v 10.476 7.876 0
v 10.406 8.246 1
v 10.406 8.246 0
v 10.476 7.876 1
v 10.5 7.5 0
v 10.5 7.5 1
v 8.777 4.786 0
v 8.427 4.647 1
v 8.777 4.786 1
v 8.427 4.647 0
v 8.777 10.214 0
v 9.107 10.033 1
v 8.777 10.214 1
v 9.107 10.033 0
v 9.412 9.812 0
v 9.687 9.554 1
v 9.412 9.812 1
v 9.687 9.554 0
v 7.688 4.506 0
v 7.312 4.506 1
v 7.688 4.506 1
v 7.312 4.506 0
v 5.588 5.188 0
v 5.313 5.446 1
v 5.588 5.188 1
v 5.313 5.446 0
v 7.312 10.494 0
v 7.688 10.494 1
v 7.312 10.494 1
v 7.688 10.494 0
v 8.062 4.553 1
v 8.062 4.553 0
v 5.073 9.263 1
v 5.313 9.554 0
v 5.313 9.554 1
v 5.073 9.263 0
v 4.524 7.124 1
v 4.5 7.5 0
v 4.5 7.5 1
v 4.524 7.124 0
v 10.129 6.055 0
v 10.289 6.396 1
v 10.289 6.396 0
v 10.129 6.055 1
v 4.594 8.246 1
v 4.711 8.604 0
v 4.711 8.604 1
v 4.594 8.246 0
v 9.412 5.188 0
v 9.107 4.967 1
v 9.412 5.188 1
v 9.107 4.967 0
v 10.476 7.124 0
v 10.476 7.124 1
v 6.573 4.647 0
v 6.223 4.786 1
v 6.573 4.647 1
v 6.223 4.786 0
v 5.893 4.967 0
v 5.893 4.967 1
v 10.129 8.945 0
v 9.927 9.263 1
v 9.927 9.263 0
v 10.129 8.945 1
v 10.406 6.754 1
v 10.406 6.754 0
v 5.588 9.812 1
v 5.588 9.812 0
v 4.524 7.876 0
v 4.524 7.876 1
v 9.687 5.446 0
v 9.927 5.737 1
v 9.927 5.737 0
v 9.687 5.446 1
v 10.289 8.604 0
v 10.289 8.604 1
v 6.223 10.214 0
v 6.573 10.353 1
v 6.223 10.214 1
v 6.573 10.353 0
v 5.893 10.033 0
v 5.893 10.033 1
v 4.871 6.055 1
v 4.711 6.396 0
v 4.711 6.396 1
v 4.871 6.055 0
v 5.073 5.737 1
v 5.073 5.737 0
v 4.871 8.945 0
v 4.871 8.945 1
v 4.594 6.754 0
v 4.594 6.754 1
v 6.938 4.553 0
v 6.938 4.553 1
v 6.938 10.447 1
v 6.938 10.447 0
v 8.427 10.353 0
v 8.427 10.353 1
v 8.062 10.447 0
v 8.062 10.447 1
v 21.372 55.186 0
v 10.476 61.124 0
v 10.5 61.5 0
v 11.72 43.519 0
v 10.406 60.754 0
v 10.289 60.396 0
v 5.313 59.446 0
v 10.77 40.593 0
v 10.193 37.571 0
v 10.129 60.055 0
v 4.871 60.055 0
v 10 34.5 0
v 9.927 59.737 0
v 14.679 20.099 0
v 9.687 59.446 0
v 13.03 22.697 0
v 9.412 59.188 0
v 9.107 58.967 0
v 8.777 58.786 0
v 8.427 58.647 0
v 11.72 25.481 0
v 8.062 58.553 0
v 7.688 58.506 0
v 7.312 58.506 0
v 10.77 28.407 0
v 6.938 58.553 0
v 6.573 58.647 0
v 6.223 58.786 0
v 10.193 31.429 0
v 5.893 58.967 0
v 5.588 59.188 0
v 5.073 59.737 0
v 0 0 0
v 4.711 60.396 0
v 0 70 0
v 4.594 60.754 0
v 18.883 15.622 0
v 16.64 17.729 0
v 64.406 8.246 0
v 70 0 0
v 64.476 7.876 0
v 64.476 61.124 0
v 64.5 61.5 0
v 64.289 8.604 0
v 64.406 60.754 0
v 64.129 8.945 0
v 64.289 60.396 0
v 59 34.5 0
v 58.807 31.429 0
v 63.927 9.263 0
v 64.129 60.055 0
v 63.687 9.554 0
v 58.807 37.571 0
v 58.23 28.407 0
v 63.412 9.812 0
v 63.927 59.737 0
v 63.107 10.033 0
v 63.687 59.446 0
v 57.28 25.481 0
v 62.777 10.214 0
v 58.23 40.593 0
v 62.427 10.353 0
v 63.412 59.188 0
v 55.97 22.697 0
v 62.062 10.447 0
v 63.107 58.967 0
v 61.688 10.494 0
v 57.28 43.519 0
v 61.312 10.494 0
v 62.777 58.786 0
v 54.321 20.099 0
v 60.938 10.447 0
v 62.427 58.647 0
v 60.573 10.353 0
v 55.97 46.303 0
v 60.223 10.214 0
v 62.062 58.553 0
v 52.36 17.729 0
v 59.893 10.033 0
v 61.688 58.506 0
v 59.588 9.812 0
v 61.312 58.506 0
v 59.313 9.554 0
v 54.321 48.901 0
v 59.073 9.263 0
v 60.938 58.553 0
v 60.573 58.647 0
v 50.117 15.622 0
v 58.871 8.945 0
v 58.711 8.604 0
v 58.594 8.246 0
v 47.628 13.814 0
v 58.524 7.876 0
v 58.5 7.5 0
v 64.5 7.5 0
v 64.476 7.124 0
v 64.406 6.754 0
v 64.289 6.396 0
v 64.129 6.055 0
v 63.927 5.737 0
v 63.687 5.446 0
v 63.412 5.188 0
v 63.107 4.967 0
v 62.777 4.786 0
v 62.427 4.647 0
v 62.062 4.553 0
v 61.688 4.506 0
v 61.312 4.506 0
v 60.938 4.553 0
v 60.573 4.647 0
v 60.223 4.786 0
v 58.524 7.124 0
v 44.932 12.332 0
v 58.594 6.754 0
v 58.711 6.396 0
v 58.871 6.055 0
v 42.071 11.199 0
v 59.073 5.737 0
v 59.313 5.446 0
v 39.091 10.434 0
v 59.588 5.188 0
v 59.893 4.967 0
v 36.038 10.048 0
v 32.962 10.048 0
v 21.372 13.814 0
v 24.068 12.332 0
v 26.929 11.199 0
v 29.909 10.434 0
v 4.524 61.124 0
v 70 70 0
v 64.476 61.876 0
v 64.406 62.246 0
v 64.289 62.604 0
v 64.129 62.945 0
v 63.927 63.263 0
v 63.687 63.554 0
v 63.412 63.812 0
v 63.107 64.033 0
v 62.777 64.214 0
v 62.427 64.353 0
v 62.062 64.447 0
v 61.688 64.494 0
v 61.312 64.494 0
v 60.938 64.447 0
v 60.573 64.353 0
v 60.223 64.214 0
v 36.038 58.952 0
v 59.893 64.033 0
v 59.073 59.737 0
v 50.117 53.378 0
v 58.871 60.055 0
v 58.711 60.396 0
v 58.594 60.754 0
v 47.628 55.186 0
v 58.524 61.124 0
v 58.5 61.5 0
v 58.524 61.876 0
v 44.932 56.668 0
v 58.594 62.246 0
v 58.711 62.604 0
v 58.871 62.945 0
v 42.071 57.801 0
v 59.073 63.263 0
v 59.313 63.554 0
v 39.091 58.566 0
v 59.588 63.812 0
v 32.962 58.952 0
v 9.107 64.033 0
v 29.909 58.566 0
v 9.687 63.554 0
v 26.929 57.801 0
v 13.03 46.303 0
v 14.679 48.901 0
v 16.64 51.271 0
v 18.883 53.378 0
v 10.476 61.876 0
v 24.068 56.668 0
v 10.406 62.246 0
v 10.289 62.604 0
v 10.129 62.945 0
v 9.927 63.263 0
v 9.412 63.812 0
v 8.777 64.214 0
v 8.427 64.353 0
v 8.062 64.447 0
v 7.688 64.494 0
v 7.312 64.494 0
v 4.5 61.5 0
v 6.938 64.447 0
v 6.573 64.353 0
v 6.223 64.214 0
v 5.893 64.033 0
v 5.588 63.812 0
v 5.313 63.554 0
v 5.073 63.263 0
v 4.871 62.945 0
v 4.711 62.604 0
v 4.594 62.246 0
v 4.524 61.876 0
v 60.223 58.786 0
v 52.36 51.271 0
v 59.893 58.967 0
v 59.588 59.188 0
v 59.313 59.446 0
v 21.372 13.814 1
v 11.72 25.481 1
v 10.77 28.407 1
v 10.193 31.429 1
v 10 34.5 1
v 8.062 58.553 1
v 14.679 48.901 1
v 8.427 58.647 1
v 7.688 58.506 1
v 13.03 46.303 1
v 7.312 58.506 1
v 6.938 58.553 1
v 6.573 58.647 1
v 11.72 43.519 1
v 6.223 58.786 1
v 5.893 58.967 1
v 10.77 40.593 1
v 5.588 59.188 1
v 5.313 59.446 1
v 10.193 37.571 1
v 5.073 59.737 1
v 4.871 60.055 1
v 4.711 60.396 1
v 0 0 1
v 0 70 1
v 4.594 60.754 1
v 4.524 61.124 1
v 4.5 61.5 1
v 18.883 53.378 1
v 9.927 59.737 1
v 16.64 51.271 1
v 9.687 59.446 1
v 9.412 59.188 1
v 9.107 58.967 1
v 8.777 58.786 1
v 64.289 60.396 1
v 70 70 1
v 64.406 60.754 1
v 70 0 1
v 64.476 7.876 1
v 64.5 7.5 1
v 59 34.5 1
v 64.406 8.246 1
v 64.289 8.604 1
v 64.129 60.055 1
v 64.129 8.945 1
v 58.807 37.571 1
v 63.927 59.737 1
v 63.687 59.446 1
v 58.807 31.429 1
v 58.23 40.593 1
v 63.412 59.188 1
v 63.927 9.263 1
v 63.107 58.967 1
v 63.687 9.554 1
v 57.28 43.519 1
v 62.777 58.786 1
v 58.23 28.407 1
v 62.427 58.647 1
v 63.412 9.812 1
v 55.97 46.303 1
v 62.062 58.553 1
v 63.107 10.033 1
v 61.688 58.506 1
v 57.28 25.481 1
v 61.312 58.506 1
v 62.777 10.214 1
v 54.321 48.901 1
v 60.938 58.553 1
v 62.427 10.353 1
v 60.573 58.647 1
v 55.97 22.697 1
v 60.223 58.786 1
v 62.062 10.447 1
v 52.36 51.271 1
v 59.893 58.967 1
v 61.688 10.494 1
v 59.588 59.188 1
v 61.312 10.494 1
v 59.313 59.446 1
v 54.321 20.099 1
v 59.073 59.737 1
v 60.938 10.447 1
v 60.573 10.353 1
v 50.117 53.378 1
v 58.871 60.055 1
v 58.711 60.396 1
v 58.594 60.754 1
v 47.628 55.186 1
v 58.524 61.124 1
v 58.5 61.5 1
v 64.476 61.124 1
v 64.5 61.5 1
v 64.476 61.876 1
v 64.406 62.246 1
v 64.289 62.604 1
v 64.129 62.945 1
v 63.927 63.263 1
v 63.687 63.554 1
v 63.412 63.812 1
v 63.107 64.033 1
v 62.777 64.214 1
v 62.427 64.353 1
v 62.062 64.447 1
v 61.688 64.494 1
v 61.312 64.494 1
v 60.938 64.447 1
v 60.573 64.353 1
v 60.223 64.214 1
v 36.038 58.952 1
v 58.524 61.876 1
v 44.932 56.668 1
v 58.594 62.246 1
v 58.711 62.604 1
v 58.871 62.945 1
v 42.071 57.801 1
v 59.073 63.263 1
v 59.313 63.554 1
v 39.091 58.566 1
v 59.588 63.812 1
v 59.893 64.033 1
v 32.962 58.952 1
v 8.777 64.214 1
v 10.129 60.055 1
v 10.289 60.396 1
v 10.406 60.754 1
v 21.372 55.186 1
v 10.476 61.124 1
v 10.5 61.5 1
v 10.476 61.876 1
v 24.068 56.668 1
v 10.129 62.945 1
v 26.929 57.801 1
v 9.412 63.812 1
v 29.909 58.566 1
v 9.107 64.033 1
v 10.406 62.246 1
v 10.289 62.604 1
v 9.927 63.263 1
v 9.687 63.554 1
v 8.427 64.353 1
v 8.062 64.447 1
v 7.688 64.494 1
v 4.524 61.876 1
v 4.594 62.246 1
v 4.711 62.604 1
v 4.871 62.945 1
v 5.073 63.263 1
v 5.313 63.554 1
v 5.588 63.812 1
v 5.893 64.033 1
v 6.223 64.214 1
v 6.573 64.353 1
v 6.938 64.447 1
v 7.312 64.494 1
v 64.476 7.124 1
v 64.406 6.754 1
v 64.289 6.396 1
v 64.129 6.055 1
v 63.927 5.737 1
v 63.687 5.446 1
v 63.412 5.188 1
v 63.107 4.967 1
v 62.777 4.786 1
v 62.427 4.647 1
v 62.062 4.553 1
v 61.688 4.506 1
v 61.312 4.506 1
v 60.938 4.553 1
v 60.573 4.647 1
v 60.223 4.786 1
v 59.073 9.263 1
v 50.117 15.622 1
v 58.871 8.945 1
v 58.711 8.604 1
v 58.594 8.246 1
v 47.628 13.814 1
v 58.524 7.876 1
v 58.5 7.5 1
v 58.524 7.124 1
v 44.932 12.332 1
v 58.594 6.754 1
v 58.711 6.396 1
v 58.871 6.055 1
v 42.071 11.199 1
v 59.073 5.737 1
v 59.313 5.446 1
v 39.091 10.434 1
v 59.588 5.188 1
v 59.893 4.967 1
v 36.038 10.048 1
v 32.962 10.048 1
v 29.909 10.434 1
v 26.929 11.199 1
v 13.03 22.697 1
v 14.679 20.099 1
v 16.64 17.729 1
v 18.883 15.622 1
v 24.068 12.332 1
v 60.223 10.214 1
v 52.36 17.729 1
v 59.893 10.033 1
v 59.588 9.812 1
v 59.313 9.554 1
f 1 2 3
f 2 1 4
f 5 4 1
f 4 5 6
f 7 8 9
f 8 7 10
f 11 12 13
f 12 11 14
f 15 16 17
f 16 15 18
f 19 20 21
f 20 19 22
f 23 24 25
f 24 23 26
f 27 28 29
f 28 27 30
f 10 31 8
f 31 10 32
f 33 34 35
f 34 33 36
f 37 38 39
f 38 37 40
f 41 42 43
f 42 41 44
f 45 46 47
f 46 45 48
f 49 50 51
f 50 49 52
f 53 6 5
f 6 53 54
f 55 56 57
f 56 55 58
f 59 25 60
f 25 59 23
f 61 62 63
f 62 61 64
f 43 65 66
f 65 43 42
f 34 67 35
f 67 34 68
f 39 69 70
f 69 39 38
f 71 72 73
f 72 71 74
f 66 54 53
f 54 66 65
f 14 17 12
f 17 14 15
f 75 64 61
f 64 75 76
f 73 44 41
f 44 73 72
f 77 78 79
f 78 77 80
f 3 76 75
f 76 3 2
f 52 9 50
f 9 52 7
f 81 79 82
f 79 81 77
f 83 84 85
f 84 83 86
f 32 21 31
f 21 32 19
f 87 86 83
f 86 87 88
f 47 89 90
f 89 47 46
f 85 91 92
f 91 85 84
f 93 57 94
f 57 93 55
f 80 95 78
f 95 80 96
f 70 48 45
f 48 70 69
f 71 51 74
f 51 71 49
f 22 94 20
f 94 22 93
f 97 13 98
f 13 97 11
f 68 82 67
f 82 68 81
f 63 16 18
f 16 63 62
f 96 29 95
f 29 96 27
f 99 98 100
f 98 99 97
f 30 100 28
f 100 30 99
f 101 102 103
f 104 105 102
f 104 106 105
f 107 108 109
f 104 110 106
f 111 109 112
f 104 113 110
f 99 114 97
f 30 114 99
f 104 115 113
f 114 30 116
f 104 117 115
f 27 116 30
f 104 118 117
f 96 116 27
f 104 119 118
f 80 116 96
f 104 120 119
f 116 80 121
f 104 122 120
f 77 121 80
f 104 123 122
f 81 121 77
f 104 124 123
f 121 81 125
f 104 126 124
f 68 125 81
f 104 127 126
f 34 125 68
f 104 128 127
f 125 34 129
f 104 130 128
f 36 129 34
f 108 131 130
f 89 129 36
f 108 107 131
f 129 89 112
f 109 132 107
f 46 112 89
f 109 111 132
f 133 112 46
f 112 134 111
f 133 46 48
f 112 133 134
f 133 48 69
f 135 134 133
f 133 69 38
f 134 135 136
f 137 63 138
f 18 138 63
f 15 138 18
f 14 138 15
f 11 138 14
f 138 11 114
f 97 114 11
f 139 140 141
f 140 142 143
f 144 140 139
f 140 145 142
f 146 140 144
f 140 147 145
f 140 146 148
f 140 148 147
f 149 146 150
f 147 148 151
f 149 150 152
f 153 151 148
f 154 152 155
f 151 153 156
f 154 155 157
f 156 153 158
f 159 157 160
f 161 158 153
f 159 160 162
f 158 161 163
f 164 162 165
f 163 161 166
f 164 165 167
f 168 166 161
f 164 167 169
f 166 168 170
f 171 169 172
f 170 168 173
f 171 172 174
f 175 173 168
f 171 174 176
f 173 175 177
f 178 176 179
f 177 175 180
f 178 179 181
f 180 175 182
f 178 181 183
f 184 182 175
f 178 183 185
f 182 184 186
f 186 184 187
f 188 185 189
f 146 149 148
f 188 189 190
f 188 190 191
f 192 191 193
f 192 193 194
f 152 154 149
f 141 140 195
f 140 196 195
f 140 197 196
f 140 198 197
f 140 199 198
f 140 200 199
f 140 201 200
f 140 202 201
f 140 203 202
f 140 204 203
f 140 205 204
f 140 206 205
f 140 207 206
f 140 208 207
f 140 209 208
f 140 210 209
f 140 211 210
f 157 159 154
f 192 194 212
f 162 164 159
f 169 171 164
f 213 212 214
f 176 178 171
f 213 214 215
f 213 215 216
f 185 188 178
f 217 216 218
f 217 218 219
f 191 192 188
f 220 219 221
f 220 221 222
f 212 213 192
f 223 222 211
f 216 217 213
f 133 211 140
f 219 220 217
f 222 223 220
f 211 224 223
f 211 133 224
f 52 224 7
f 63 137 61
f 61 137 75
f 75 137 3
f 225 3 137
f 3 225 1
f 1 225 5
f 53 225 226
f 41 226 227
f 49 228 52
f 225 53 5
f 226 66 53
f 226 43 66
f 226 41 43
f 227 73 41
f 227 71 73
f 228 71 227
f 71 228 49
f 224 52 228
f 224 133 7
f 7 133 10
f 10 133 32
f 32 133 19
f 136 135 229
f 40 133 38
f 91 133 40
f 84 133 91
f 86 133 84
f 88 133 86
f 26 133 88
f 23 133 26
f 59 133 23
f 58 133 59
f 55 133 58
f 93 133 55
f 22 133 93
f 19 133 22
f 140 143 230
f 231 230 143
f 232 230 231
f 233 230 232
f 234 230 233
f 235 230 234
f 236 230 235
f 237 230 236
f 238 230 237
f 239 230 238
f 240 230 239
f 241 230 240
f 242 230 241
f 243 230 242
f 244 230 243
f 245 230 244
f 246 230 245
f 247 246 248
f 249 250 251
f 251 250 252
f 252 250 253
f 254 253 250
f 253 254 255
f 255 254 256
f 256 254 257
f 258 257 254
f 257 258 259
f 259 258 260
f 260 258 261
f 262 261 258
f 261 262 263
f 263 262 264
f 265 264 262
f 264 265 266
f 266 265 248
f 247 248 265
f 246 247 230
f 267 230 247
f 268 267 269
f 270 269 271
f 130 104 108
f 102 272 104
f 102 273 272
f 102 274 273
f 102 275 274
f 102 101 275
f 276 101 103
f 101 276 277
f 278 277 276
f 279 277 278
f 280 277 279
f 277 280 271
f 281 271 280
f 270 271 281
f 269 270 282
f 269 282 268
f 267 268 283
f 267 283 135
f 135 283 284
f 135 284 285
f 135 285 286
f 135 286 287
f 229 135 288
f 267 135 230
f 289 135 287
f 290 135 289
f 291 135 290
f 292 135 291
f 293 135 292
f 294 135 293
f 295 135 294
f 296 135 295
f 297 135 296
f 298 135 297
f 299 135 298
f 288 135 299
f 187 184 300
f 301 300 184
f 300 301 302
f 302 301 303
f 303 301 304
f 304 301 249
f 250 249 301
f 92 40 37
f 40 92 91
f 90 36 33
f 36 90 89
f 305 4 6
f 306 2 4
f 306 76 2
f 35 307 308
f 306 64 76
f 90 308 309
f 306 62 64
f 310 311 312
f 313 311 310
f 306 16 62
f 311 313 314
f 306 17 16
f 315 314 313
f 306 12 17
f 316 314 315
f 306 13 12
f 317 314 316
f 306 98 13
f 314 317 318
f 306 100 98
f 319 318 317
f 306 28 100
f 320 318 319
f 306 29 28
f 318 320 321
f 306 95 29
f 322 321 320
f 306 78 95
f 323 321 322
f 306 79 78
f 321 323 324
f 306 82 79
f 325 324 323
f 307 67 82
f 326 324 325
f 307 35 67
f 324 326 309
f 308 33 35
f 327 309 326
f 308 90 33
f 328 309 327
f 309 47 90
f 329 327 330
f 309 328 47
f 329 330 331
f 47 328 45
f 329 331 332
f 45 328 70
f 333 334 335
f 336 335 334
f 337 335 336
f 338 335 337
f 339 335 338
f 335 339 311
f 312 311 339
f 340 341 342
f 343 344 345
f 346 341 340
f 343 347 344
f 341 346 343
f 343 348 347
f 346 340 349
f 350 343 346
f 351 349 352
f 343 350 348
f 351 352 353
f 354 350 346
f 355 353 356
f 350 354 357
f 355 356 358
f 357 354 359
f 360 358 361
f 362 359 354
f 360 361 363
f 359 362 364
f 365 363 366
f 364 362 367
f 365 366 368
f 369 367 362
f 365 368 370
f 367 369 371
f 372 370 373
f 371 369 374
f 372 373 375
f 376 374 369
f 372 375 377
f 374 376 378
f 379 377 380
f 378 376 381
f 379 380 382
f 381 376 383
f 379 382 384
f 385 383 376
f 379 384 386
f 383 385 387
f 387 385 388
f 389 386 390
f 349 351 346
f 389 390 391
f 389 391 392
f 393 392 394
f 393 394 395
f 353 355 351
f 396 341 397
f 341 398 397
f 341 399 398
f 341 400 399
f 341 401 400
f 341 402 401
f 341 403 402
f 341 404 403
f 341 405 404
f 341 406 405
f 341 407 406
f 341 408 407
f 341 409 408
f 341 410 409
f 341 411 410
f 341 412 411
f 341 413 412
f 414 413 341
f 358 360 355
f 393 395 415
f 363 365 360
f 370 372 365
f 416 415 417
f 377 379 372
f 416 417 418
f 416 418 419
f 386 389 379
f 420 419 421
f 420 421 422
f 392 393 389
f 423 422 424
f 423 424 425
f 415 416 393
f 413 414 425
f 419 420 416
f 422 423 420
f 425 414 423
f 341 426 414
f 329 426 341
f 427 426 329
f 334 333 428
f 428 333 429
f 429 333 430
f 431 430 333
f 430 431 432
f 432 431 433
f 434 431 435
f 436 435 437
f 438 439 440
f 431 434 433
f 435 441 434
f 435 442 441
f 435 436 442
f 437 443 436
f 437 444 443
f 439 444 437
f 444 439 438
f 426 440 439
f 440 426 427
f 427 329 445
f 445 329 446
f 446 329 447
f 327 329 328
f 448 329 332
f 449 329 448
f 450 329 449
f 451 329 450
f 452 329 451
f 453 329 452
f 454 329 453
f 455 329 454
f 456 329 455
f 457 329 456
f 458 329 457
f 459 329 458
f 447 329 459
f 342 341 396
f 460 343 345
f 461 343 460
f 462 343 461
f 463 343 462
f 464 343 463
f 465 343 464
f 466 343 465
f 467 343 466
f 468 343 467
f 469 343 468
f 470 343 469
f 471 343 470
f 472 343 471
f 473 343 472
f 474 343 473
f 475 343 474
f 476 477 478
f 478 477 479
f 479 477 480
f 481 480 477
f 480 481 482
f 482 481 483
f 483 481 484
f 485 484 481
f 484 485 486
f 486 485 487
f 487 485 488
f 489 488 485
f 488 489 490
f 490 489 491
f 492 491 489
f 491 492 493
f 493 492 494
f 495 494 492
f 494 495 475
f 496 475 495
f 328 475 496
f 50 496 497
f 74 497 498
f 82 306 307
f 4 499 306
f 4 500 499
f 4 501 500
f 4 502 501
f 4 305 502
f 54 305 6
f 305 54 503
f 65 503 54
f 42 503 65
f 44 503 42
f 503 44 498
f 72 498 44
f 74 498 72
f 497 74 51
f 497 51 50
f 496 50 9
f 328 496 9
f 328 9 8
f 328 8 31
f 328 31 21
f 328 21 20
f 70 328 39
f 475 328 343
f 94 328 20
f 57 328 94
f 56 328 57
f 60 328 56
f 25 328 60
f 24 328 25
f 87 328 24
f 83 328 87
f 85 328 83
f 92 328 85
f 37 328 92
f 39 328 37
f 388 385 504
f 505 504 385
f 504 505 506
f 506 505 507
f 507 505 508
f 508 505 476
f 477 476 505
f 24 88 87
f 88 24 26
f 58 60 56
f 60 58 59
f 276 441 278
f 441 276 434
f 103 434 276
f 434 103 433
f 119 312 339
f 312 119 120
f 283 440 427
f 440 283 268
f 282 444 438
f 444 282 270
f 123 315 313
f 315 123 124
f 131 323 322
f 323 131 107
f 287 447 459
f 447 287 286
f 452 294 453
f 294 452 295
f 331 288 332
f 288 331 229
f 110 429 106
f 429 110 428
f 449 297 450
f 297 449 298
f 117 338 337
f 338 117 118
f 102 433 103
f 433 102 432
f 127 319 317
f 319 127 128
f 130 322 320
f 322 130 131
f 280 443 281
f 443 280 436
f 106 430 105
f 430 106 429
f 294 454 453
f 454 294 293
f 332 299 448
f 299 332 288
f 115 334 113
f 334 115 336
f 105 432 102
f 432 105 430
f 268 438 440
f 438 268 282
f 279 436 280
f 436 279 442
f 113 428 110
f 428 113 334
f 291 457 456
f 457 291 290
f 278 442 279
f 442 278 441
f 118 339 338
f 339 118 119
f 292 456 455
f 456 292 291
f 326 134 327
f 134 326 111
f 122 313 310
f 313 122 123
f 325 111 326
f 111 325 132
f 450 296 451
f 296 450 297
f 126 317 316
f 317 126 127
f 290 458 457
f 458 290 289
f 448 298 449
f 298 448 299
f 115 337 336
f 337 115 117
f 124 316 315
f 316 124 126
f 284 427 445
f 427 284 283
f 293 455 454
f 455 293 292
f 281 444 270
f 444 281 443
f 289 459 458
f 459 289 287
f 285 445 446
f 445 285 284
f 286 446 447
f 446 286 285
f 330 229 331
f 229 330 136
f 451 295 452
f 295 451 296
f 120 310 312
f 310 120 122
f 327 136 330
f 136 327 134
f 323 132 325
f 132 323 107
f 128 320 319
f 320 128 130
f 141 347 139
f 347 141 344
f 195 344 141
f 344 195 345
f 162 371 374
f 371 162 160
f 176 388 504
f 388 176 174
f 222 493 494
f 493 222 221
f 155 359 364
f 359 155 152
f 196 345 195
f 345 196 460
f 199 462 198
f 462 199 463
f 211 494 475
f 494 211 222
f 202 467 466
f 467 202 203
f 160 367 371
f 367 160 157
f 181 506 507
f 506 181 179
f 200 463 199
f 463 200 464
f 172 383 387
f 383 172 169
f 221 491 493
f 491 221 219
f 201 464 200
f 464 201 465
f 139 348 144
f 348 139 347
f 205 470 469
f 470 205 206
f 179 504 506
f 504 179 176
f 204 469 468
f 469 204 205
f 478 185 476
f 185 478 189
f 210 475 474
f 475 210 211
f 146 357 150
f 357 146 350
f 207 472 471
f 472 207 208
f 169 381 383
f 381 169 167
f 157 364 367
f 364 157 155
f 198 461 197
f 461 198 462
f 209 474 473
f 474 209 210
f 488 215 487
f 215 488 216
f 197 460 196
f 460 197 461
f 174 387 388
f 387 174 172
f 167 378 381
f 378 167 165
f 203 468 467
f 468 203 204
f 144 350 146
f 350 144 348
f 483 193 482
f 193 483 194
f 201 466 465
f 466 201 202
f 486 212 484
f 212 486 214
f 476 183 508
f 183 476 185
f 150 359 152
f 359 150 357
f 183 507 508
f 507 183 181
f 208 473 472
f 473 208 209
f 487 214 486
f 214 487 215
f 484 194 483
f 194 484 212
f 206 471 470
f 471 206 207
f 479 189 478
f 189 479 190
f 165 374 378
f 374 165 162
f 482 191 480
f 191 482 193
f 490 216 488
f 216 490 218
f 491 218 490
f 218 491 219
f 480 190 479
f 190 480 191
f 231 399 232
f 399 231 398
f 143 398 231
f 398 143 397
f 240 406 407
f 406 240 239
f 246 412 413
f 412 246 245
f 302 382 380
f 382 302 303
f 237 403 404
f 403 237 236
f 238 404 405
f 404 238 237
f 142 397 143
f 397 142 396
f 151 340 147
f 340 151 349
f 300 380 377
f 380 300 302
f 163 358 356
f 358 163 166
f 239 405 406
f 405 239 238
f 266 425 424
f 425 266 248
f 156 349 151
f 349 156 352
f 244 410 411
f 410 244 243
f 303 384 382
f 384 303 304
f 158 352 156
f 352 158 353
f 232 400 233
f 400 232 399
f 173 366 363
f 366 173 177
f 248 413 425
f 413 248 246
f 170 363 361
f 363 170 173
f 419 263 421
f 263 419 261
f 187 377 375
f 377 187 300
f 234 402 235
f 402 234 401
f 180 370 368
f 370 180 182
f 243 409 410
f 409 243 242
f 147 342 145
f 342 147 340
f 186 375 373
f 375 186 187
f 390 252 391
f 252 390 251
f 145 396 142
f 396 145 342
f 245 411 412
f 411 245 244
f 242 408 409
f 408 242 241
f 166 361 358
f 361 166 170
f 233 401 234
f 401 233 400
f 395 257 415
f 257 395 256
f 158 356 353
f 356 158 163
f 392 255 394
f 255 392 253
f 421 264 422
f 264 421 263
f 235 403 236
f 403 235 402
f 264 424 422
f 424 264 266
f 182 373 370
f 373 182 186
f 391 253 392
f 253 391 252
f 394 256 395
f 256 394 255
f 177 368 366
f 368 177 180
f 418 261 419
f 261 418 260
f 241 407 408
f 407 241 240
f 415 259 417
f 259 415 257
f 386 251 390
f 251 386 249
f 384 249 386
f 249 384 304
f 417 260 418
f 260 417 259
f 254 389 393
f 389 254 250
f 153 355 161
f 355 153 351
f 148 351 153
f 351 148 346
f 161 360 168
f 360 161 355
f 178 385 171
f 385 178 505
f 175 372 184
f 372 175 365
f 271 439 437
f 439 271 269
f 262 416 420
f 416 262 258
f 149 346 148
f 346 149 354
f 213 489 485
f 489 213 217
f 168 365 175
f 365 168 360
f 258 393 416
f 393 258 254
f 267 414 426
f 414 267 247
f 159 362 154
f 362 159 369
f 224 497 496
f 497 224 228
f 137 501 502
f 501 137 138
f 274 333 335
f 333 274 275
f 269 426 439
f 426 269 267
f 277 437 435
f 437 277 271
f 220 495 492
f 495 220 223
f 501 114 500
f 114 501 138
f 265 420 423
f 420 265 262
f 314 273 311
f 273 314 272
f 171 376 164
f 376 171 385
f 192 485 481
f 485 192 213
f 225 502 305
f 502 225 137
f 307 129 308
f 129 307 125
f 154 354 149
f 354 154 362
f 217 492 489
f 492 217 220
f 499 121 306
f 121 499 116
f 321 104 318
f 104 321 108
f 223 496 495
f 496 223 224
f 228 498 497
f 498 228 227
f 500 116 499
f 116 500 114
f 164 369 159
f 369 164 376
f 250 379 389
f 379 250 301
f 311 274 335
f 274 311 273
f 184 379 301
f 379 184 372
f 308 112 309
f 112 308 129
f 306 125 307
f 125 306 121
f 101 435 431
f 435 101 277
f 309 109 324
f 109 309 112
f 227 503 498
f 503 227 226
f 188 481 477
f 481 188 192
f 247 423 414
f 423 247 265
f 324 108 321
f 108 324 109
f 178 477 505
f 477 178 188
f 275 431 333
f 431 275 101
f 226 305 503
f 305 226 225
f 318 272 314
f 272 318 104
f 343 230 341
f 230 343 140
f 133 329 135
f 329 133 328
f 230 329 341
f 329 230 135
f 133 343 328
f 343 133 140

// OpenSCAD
$fn=50;
module top() {
    difference() {
        cube([70,70,1]);
        translate([49/2+10,49/2+10,0]) holes();
    }
}

module holes() {
    cylinder(1, d=49);
    for (i=[-1,1], j=[-1,1]) {
        echo(i,j);
        #translate([27*i,27*j,0]) cylinder(1, r=3);
    }
}

top();
